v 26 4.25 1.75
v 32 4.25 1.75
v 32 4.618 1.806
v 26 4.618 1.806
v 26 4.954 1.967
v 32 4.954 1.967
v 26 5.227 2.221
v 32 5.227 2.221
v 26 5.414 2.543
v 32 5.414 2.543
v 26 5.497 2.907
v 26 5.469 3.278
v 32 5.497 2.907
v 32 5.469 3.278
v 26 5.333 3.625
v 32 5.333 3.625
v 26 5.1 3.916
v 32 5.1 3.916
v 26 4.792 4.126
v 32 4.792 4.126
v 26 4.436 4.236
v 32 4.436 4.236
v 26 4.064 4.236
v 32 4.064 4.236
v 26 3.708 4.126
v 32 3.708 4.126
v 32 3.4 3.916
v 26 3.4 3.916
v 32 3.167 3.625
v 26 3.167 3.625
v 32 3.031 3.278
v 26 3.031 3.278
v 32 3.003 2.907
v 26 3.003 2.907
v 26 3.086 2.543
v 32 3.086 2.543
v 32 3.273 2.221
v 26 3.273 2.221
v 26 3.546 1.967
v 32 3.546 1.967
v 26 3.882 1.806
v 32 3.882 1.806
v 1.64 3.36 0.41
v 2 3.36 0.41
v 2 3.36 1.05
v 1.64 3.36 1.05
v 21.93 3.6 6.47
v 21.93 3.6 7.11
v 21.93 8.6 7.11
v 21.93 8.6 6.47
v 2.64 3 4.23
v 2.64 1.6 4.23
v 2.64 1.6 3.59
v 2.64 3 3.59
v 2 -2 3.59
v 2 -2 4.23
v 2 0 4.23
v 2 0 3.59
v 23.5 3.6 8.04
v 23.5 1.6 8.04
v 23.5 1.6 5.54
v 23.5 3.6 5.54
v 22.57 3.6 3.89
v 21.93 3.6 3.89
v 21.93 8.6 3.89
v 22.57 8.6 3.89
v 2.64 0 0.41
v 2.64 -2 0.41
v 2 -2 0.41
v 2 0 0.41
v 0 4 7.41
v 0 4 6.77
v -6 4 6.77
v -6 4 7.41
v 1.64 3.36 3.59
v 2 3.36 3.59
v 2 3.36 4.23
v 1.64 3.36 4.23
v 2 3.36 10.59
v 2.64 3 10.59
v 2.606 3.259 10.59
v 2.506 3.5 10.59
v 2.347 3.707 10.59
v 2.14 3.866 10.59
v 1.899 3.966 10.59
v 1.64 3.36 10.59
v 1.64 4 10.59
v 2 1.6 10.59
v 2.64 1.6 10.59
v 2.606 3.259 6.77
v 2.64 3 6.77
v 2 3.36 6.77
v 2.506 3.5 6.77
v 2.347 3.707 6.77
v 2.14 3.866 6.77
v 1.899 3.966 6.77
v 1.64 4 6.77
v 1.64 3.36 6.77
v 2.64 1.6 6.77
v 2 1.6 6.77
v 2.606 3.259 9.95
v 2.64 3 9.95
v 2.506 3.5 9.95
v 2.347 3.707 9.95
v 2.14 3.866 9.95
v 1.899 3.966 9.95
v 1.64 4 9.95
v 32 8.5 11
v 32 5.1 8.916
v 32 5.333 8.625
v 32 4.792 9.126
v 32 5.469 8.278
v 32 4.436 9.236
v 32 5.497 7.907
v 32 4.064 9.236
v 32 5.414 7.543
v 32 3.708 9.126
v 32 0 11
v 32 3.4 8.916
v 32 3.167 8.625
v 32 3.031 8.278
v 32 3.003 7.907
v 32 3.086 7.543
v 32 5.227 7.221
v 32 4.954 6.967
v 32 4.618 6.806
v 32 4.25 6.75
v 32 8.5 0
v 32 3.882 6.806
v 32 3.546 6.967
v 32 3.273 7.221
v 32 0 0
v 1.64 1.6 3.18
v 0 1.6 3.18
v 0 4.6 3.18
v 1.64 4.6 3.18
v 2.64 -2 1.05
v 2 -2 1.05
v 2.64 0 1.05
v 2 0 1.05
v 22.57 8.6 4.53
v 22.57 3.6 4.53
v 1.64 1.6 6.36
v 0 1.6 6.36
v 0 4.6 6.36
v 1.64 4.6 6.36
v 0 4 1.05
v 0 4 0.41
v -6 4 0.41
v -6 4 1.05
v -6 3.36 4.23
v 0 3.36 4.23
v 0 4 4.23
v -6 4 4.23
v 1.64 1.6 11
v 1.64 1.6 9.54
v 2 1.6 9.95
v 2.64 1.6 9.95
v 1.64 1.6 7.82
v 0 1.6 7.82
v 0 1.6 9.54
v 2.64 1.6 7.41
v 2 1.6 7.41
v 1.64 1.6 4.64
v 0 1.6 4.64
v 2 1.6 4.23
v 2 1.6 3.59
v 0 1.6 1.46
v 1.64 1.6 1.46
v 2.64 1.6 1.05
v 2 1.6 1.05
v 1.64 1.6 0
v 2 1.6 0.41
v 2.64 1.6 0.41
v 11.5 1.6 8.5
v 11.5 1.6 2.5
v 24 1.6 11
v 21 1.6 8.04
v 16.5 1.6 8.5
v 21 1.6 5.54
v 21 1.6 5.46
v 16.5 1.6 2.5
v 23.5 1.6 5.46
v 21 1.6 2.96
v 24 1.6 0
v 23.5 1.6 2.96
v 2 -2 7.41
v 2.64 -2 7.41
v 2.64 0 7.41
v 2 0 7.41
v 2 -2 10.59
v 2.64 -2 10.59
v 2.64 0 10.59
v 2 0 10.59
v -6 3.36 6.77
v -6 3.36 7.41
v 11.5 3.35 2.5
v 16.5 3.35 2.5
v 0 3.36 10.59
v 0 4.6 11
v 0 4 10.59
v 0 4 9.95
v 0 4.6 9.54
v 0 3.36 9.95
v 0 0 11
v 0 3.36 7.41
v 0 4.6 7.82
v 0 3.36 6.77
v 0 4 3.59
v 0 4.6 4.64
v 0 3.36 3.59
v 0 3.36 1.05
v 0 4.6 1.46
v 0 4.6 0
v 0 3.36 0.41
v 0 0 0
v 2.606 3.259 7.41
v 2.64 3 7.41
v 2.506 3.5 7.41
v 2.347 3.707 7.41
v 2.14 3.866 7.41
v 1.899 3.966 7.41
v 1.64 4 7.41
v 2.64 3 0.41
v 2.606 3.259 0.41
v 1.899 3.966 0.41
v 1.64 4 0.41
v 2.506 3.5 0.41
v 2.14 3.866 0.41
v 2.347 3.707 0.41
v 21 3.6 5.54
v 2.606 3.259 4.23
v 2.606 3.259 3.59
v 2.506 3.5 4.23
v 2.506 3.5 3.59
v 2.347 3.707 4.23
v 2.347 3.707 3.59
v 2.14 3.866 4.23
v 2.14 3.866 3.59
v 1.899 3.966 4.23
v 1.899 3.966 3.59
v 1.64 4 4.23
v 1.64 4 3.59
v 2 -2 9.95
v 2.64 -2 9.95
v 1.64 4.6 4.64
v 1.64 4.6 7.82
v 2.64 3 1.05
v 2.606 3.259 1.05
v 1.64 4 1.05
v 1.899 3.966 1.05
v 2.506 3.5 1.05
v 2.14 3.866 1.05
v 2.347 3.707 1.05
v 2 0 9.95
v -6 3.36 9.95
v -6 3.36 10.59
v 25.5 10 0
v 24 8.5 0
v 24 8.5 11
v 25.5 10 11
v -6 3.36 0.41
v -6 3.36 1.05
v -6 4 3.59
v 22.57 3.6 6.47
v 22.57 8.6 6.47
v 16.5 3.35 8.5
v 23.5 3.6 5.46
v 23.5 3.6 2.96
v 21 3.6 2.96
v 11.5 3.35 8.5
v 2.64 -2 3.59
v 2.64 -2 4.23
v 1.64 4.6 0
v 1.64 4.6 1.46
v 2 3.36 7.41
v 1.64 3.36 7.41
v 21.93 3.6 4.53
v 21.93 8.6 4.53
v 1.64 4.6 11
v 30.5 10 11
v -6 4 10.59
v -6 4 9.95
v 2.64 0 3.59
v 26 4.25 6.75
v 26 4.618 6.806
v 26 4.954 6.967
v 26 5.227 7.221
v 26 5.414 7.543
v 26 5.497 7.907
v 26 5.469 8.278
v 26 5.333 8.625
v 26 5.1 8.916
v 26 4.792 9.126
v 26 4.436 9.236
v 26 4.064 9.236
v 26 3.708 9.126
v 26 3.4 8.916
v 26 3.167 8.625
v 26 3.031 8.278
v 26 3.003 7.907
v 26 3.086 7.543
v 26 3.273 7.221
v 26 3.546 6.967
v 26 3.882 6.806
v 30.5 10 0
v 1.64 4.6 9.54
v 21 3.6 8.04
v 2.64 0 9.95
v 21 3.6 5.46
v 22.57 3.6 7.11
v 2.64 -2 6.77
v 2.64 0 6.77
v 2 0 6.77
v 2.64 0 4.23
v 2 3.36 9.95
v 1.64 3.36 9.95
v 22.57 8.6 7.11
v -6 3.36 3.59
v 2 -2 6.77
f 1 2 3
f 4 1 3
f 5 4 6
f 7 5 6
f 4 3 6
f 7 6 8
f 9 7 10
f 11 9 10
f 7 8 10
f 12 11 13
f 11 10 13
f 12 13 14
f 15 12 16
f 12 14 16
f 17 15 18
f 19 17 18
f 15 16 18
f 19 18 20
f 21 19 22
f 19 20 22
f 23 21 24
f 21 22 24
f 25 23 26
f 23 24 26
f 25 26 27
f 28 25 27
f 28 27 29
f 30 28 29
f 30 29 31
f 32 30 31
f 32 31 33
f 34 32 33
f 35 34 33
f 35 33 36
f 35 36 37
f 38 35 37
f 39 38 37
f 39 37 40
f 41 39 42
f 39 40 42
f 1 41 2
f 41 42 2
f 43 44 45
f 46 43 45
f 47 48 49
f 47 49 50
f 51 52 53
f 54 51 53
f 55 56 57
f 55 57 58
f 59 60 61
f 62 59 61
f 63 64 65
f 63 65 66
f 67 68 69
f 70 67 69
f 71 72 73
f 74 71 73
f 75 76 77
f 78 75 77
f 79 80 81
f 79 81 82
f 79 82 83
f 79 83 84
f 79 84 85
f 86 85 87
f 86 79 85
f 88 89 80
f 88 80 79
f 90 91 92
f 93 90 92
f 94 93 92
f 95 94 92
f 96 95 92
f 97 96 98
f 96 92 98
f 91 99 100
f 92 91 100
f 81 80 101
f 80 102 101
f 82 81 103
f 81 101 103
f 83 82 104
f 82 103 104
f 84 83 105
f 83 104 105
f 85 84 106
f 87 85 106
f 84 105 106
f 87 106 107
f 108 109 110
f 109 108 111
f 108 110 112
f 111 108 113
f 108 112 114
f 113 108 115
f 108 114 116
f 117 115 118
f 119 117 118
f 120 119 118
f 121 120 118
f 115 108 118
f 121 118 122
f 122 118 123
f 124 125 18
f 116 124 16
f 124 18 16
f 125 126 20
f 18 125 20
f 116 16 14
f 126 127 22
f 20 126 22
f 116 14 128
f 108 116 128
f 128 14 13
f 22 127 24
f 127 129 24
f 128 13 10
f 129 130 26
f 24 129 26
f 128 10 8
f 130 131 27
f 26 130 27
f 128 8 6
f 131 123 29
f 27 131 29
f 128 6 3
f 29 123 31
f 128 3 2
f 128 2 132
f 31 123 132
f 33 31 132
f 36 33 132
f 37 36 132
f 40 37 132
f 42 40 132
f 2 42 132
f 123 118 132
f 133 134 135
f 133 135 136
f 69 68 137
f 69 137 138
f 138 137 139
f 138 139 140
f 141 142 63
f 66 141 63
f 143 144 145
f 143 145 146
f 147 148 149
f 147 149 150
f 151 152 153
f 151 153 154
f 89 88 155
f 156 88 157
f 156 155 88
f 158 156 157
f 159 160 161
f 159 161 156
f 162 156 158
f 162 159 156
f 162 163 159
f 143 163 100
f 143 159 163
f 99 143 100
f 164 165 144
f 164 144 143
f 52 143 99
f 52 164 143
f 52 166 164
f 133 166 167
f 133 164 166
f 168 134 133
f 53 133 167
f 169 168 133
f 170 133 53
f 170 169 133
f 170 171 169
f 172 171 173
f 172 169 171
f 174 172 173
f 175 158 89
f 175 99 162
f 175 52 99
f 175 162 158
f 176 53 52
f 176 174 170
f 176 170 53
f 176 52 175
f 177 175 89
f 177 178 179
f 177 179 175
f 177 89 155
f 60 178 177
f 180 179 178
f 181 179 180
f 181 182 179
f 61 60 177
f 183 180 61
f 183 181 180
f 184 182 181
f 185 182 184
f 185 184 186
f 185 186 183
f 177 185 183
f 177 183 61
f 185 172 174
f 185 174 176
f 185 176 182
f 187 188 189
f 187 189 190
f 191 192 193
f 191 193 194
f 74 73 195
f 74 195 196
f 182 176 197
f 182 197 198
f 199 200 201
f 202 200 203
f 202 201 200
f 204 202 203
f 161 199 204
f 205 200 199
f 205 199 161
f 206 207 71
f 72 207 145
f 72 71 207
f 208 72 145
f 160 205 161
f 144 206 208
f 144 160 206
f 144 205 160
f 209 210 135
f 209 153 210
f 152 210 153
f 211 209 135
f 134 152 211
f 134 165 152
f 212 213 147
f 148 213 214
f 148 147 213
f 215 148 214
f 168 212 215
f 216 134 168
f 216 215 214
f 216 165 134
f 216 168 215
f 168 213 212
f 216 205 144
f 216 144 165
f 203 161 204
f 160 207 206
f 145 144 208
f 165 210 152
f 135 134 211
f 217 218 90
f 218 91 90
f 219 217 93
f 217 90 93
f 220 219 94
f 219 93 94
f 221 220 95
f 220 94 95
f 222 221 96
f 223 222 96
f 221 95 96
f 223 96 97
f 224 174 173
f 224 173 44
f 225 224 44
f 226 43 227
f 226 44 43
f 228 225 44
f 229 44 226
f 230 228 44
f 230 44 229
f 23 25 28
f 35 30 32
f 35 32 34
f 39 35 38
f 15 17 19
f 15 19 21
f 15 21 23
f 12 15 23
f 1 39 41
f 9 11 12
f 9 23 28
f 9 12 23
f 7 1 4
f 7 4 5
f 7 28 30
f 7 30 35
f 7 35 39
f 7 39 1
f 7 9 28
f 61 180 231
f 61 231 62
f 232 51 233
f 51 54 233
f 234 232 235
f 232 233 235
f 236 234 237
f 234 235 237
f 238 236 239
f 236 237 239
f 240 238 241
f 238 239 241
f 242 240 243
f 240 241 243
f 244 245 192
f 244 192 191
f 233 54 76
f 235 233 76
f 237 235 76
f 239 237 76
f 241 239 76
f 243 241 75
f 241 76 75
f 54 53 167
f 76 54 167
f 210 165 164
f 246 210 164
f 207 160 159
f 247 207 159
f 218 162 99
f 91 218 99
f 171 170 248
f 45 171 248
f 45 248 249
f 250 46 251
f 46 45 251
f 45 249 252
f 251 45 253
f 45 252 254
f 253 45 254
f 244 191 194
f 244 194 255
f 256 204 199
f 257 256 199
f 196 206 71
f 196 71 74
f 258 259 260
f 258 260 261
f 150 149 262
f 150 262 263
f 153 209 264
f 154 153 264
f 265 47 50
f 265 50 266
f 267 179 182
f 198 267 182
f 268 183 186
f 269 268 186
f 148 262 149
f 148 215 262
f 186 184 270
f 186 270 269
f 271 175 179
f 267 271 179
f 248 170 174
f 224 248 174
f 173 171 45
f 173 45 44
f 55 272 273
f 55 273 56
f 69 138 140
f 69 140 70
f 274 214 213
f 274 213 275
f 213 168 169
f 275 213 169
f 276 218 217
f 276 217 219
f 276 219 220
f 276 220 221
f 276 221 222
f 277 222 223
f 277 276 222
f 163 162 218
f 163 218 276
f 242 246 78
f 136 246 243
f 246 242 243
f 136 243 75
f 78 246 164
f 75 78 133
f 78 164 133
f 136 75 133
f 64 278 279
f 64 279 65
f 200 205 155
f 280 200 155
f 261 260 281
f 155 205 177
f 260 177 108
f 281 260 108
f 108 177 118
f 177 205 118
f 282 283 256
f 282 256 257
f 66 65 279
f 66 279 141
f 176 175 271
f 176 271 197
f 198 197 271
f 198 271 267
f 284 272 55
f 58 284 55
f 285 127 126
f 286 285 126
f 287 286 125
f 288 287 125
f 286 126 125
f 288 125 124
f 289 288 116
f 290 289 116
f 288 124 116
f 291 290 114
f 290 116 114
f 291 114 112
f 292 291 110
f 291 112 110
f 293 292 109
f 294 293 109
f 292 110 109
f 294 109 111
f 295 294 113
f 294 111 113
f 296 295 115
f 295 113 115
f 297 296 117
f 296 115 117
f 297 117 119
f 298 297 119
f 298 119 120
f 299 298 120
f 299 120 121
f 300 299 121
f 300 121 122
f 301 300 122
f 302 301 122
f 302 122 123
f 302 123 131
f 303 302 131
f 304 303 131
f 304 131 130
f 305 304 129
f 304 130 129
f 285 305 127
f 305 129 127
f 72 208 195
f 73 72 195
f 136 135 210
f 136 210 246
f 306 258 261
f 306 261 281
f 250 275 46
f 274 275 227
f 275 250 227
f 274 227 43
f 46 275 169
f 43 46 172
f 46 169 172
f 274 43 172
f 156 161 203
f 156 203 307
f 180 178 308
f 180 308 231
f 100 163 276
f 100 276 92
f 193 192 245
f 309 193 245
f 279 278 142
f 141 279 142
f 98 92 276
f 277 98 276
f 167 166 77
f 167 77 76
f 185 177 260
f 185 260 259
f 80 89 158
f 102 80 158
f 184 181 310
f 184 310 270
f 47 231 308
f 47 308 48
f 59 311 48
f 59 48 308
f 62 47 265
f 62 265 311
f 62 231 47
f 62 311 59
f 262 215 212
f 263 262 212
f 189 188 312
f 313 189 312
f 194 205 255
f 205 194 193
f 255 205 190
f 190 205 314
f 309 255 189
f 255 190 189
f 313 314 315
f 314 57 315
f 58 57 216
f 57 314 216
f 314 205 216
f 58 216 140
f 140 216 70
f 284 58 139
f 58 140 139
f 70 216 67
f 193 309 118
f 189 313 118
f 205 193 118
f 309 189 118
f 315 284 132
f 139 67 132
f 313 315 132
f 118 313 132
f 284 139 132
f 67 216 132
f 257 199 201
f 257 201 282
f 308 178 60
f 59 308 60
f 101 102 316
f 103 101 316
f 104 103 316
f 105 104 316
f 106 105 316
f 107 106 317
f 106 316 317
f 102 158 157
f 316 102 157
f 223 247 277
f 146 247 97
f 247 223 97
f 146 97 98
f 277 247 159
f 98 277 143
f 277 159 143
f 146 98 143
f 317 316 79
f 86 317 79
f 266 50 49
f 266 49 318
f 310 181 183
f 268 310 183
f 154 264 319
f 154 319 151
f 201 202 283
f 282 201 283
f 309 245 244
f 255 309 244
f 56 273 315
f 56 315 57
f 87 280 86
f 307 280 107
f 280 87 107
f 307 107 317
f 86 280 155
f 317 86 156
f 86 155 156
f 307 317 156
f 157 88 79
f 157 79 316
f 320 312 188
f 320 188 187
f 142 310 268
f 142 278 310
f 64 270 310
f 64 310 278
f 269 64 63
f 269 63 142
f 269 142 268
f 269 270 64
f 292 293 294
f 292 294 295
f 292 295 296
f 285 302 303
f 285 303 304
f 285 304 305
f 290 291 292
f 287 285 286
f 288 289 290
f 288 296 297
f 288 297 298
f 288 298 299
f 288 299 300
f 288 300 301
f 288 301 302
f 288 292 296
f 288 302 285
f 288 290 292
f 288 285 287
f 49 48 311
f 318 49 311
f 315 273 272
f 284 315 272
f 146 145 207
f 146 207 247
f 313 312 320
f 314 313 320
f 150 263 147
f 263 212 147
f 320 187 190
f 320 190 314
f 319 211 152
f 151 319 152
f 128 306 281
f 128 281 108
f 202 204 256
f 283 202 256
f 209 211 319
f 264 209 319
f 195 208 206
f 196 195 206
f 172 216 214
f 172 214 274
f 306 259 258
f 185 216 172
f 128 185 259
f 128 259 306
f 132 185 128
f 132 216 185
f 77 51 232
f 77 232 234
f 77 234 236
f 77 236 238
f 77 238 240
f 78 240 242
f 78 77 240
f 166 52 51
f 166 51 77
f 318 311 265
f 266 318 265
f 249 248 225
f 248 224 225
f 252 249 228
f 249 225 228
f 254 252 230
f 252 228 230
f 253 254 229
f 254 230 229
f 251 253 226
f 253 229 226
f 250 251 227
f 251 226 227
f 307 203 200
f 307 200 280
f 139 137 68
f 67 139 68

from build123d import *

# Parameters (mm, degrees)
SKETCH_1_W           = 32
SKETCH_1_H           = 11
EXTRUDE_1_DEPTH      = 1.6
SKETCH_2_W           = 0.64
SKETCH_2_H           = 0.64
EXTRUDE_2_DEPTH      = 6
SKETCH_3_W           = 0.64
SKETCH_3_H           = 0.64
EXTRUDE_3_DEPTH      = 8
FILLET_2_R           = 1
FILLET_3_R           = 1
FILLET_4_R           = 1
FILLET_5_R           = 1
SKETCH_4_W           = 8
SKETCH_4_H           = 11
EXTRUDE_4_DEPTH      = 8.4
FILLET_START         = 9
FILLET_4_2_OUTLINE_W = 6
FILLET_4_2_OUTLINE_H = 13
FILLET_4_2_DEPTH     = 1.960155108
FILLET_START_2       = 28.637824638
FILLET_5_2_OUTLINE_W = 5
FILLET_5_2_OUTLINE_H = 13
FILLET_5_2_DEPTH     = 2.362175362
SKETCH_5_R           = 1.25
CUT_EXTRUDE_1_DEPTH  = 6
SKETCH_6_W           = 2.5
SKETCH_6_H           = 2.5
EXTRUDE_5_DEPTH      = 2
SKETCH_7_W           = 0.64
SKETCH_7_H           = 0.64
EXTRUDE_6_DEPTH      = 5
SKETCH_8_W           = 5
SKETCH_8_H           = 6
EXTRUDE_7_DEPTH      = 1.75
SKETCH_9_W           = 1.64
SKETCH_9_H           = 1.46
EXTRUDE_8_DEPTH      = 3


with BuildPart() as part:
    # Эскиз1 → Бобышка-Вытянуть1 (new body)
    with BuildSketch(Plane(origin=(0, 0, 0), x_dir=(1, 0, 0), z_dir=(0, 1, 0))):
        with Locations((16, -5.5)):
            Rectangle(SKETCH_1_W, SKETCH_1_H)
    extrude(amount=EXTRUDE_1_DEPTH)

    # Эскиз2 → Бобышка-Вытянуть2 (add)
    with BuildSketch(Plane(origin=(0, -2, 0), x_dir=(-1, 0, 0), z_dir=(0, -1, 0))):
        with Locations((-2.32, -0.73)):
            Rectangle(SKETCH_2_W, SKETCH_2_H)
        with Locations((-2.32, -3.91)):
            Rectangle(SKETCH_2_W, SKETCH_2_H)
        with Locations((-2.32, -7.09)):
            Rectangle(SKETCH_2_W, SKETCH_2_H)
        with Locations((-2.32, -10.27)):
            Rectangle(SKETCH_2_W, SKETCH_2_H)
    extrude(amount=-EXTRUDE_2_DEPTH)

    # Эскиз3 → Бобышка-Вытянуть3 (add)
    with BuildSketch(Plane.ZY.offset(-2)):
        with Locations((0.73, 3.68)):
            Rectangle(SKETCH_3_W, SKETCH_3_H)
        with Locations((3.91, 3.68)):
            Rectangle(SKETCH_3_W, SKETCH_3_H)
        with Locations((7.09, 3.68)):
            Rectangle(SKETCH_3_W, SKETCH_3_H)
        with Locations((10.27, 3.68)):
            Rectangle(SKETCH_3_W, SKETCH_3_H)
    extrude(amount=EXTRUDE_3_DEPTH)

    # Скругление2
    fillet_2_edges = [part.edges().sort_by_distance(p)[0] for p in [
        (2.64, 4, 10.27),
    ]]
    fillet(fillet_2_edges, radius=FILLET_2_R)

    # Скругление3
    fillet_3_edges = [part.edges().sort_by_distance(p)[0] for p in [
        (2.64, 4, 0.73),
    ]]
    fillet(fillet_3_edges, radius=FILLET_3_R)

    # Fillet 4
    fillet_4_edges = [part.edges().sort_by_distance(p)[0] for p in [
        (2.64, 4, 3.91),
    ]]
    fillet(fillet_4_edges, radius=FILLET_4_R)

    # Fillet 5
    fillet_5_edges = [part.edges().sort_by_distance(p)[0] for p in [
        (2.64, 4, 7.09),
    ]]
    fillet(fillet_5_edges, radius=FILLET_5_R)

    # Эскиз4 → Бобышка-Вытянуть4 (add)
    with BuildSketch(Plane(origin=(0, 1.6, 0), x_dir=(1, 0, 0), z_dir=(0, 1, 0))):
        with Locations((28, -5.5)):
            Rectangle(SKETCH_4_W, SKETCH_4_H)
    extrude(amount=EXTRUDE_4_DEPTH)

    # Fillet 4 2: read off the stored shape, not the designer's step
    # Fillet 4 2 outline → Fillet 4 2 (cut)
    with BuildSketch(Plane(origin=(0, 0, 0), x_dir=(0.707106781186548, 0.707106781186547, 0), z_dir=(0.707106781186547, -0.707106781186548, 0)).offset(FILLET_START)):
        with Locations((24, 5.5)):
            Rectangle(FILLET_4_2_OUTLINE_W, FILLET_4_2_OUTLINE_H)
    extrude(amount=FILLET_4_2_DEPTH, mode=Mode.SUBTRACT)

    # Fillet 5 2: read off the stored shape, not the designer's step
    # Fillet 5 2 outline → Fillet 5 2 (cut)
    with BuildSketch(Plane(origin=(0, 0, 0), x_dir=(0.707106781186548, -0.707106781186547, 0), z_dir=(0.707106781186547, 0.707106781186548, 0)).offset(FILLET_START_2)):
        with Locations((15.5, -5.5)):
            Rectangle(FILLET_5_2_OUTLINE_W, FILLET_5_2_OUTLINE_H)
    extrude(amount=FILLET_5_2_DEPTH, mode=Mode.SUBTRACT)

    # Эскиз5 → Вырез-Вытянуть1 (cut)
    with BuildSketch(Plane(origin=(32, 0, 0), x_dir=(0, 0, -1), z_dir=(1, 0, 0))):
        with Locations((-8, 4.25)):
            Circle(SKETCH_5_R)
        with Locations((-3, 4.25)):
            Circle(SKETCH_5_R)
    extrude(amount=-CUT_EXTRUDE_1_DEPTH, mode=Mode.SUBTRACT)

    # Эскиз6 → Бобышка-Вытянуть5 (add)
    with BuildSketch(Plane(origin=(0, 1.6, 0), x_dir=(1, 0, 0), z_dir=(0, 1, 0))):
        with Locations((22.25, -4.21)):
            Rectangle(SKETCH_6_W, SKETCH_6_H)
        with Locations((22.25, -6.79)):
            Rectangle(SKETCH_6_W, SKETCH_6_H)
    extrude(amount=EXTRUDE_5_DEPTH)

    # Эскиз7 → Бобышка-Вытянуть6 (add)
    with BuildSketch(Plane(origin=(0, 3.6, 0), x_dir=(1, 0, 0), z_dir=(0, 1, 0))):
        with Locations((22.25, -4.21)):
            Rectangle(SKETCH_7_W, SKETCH_7_H)
        with Locations((22.25, -6.79)):
            Rectangle(SKETCH_7_W, SKETCH_7_H)
    extrude(amount=EXTRUDE_6_DEPTH)

    # Эскиз8 → Бобышка-Вытянуть7 (add)
    with BuildSketch(Plane(origin=(0, 1.6, 0), x_dir=(1, 0, 0), z_dir=(0, 1, 0))):
        with Locations((14, -5.5)):
            Rectangle(SKETCH_8_W, SKETCH_8_H)
    extrude(amount=EXTRUDE_7_DEPTH)

    # Эскиз9 → Бобышка-Вытянуть8 (add)
    with BuildSketch(Plane(origin=(0, 1.6, 0), x_dir=(1, 0, 0), z_dir=(0, 1, 0))):
        with Locations((0.82, -0.73)):
            Rectangle(SKETCH_9_W, SKETCH_9_H)
        with Locations((0.82, -3.91)):
            Rectangle(SKETCH_9_W, SKETCH_9_H)
        with Locations((0.82, -7.09)):
            Rectangle(SKETCH_9_W, SKETCH_9_H)
        with Locations((0.82, -10.27)):
            Rectangle(SKETCH_9_W, SKETCH_9_H)
    extrude(amount=EXTRUDE_8_DEPTH)


solid = part.part
